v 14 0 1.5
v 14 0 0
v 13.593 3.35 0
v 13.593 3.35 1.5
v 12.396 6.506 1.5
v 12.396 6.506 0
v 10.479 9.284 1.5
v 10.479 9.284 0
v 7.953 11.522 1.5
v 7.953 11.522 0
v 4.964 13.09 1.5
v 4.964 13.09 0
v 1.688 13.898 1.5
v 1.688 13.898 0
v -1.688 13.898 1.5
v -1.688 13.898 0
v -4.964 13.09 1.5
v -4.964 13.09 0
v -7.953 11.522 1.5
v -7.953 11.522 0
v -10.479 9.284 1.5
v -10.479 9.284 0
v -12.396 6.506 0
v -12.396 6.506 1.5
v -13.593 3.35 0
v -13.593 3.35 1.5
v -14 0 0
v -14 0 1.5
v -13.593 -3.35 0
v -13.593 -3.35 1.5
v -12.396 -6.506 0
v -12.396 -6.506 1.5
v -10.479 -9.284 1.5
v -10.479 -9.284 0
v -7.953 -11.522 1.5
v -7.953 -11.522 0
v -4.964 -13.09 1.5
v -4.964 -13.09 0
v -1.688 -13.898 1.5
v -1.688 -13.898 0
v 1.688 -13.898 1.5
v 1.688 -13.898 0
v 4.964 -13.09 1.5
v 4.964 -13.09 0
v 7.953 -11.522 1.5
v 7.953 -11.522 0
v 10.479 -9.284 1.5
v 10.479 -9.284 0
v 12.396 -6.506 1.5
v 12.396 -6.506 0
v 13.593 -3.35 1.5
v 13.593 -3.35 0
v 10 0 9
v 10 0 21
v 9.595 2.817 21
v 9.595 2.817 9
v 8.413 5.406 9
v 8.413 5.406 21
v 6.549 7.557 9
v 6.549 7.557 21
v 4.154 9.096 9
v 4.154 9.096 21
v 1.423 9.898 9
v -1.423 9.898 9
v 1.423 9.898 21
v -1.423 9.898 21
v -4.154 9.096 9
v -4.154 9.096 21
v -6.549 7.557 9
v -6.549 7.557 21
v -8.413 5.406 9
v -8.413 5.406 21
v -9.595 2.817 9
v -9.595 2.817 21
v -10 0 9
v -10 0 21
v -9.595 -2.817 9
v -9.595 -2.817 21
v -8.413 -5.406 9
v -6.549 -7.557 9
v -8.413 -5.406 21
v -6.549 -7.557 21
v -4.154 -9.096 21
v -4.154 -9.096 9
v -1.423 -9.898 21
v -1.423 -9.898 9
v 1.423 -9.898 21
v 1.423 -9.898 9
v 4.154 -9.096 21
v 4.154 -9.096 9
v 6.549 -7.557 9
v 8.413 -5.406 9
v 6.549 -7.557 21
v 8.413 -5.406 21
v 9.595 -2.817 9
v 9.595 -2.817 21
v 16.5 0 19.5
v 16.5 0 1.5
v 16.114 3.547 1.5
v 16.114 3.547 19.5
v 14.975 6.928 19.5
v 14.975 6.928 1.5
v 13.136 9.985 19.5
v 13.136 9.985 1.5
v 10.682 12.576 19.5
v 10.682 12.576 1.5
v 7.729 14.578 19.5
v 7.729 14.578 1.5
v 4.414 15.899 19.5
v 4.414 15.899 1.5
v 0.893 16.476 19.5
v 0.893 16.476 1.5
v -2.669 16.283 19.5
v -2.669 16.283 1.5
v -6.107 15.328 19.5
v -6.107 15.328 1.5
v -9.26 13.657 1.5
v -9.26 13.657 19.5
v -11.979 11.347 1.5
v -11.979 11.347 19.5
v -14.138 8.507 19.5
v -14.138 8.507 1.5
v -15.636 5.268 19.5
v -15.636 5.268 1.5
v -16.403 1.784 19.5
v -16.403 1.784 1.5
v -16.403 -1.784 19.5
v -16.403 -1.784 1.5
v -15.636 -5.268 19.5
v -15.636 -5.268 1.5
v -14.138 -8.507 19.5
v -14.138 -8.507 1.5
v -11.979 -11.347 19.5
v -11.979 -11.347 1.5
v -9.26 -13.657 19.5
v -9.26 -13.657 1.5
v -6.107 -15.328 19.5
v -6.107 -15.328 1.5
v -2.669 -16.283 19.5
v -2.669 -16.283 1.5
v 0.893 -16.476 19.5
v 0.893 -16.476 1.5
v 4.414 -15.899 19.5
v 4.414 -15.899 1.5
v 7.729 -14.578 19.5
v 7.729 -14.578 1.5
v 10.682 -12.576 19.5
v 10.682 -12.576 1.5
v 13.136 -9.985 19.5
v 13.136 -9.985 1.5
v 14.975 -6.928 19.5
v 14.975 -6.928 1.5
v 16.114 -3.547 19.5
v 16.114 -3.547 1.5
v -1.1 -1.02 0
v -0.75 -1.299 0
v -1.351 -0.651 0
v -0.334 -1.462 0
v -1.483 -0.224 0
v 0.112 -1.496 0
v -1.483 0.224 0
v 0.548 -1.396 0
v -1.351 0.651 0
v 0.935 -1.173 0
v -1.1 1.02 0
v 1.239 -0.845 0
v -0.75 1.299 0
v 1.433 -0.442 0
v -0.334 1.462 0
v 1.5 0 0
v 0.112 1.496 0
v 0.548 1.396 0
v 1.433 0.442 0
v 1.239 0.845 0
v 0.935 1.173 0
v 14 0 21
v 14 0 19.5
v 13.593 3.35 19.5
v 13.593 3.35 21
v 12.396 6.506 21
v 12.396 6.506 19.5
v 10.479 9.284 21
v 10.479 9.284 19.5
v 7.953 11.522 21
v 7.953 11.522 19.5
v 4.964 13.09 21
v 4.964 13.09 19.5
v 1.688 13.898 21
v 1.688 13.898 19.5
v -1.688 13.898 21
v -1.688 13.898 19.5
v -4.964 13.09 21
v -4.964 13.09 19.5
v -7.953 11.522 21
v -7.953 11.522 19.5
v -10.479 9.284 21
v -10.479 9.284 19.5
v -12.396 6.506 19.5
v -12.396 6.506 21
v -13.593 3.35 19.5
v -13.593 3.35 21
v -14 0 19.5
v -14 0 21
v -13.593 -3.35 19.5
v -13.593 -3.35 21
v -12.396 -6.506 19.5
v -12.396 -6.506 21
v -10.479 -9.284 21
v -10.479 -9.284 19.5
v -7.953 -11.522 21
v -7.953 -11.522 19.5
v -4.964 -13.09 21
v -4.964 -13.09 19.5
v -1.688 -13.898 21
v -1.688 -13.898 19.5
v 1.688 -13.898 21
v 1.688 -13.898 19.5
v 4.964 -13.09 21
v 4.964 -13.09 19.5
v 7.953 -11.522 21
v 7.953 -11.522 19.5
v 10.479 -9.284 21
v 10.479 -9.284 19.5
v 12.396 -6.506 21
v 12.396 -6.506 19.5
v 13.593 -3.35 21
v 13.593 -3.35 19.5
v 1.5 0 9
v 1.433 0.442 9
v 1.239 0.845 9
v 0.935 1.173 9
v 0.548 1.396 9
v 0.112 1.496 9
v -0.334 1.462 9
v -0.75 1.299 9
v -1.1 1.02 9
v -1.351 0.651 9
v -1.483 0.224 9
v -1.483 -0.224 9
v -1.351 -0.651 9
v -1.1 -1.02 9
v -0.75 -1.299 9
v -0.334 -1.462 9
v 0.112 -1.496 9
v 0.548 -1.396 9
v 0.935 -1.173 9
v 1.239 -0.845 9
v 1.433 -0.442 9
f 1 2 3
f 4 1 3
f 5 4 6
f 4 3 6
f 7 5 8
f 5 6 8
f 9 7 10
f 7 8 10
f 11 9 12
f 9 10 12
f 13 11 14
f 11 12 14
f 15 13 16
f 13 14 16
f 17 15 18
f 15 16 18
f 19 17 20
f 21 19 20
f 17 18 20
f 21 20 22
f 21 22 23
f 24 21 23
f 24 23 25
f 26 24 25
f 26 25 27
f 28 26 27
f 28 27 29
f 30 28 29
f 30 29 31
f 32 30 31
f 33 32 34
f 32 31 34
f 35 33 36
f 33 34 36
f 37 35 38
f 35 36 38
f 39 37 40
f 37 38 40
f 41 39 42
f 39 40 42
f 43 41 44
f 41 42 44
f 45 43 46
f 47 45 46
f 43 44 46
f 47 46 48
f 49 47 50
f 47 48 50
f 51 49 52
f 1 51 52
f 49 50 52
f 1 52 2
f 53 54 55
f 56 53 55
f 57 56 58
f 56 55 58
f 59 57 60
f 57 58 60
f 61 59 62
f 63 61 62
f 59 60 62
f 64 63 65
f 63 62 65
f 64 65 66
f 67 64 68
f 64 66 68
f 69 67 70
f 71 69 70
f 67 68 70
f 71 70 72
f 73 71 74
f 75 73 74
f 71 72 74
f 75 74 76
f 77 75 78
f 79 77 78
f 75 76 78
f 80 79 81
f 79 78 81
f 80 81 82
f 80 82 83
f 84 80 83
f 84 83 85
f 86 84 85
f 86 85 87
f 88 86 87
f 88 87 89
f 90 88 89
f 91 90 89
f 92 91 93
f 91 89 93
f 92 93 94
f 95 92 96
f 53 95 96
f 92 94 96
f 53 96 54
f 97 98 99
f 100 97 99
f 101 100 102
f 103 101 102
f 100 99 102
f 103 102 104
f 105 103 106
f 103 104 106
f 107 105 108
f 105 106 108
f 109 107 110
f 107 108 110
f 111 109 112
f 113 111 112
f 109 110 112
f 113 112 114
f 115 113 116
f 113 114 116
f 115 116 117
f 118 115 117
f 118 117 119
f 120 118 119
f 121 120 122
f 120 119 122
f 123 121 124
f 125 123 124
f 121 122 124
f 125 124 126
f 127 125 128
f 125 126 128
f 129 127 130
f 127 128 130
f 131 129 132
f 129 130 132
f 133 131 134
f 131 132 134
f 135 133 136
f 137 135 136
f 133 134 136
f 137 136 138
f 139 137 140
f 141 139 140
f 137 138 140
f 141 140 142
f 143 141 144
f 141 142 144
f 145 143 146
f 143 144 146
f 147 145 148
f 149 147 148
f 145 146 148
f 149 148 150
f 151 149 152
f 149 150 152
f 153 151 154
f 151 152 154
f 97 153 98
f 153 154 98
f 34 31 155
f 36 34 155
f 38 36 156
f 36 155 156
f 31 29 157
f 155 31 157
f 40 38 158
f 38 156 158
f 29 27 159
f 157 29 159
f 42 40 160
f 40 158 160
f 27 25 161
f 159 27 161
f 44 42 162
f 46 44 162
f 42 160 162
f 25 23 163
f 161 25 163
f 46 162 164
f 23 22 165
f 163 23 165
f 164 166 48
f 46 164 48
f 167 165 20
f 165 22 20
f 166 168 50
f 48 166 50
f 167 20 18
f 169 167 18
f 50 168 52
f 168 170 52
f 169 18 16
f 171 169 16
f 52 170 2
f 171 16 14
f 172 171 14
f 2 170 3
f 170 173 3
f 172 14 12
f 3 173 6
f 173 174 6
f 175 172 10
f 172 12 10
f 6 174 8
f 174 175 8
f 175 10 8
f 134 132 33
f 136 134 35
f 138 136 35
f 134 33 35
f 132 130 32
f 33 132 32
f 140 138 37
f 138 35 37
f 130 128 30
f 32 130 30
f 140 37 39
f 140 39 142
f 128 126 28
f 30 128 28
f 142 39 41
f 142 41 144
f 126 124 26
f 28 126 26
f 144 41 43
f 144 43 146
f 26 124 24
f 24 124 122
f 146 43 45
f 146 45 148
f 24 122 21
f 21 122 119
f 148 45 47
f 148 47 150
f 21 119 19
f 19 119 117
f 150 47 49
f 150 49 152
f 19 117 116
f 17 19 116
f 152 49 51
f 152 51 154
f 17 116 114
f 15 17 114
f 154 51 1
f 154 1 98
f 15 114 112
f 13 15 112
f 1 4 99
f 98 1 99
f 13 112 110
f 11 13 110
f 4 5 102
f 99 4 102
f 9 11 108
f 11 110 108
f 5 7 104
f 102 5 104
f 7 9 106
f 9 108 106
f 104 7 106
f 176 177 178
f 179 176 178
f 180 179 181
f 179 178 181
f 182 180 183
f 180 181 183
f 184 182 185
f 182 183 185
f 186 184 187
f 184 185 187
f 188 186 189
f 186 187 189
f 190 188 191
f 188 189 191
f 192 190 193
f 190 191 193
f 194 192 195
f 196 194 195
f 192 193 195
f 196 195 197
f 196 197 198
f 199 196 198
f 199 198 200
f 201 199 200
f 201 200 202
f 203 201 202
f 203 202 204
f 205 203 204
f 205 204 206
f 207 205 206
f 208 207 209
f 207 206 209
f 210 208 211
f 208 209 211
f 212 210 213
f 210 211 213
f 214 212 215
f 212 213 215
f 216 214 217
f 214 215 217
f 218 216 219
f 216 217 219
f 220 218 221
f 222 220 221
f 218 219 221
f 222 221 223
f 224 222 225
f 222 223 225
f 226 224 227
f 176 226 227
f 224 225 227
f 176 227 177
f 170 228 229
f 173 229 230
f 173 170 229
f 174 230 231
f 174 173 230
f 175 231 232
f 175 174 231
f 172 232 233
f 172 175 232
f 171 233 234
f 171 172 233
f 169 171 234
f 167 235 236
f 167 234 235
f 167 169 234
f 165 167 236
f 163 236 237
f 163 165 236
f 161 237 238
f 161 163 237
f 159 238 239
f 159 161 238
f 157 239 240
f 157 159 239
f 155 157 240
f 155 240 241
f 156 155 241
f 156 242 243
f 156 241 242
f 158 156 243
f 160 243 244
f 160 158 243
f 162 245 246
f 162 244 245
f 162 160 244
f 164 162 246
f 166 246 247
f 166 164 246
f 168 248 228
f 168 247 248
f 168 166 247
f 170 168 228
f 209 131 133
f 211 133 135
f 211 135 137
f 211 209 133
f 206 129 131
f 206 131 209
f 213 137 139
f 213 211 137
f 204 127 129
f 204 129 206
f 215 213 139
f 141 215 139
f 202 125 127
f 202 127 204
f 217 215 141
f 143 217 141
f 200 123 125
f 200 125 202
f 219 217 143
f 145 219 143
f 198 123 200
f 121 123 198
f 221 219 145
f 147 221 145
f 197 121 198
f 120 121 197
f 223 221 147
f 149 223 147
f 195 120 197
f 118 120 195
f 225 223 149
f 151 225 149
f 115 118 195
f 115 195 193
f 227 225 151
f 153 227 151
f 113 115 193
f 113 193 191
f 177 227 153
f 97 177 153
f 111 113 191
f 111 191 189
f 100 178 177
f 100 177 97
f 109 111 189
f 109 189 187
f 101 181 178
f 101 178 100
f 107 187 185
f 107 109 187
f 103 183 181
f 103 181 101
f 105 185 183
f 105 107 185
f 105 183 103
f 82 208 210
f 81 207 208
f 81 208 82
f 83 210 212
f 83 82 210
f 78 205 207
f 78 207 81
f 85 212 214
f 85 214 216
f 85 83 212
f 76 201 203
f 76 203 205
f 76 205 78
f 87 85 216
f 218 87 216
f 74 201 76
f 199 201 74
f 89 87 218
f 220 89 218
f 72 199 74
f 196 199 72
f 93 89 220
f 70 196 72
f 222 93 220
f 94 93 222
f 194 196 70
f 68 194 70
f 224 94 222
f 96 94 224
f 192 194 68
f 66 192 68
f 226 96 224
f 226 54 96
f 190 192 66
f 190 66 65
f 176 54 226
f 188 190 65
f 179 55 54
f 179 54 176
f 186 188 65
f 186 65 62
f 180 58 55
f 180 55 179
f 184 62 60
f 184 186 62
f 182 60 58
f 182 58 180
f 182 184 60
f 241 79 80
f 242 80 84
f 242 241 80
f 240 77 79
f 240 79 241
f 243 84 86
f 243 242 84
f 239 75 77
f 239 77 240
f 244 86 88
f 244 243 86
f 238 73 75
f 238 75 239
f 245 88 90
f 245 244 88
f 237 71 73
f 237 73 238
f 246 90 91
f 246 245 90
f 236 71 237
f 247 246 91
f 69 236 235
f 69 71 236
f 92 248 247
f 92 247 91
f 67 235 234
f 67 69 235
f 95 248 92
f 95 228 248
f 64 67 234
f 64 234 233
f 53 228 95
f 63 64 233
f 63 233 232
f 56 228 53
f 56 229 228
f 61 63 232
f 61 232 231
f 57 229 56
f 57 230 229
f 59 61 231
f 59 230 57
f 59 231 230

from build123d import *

# Parameters (mm, degrees)
SKETCH1_R           = 14
SKETCH1_R_2         = 1.5
BOSS_EXTRUDE1_DEPTH = 1.5
SKETCH2_R           = 10.5
SKETCH2_R_2         = 1.5
BOSS_EXTRUDE2_DEPTH = 18
SKETCH3_R           = 14
SKETCH3_R_2         = 1.5
BOSS_EXTRUDE3_DEPTH = 1.5
SKETCH4_R           = 10
CUT_EXTRUDE1_DEPTH  = 12
SKETCH5_R           = 16.5
SKETCH5_R_2         = 10.5
BOSS_EXTRUDE4_DEPTH = 18


with BuildPart() as part:
    # Sketch1 → Boss-Extrude1 (new body)
    with BuildSketch(Plane.XY):
        Circle(SKETCH1_R)
        Circle(SKETCH1_R_2, mode=Mode.SUBTRACT)
    extrude(amount=BOSS_EXTRUDE1_DEPTH)

    # Sketch2 → Boss-Extrude2 (add)
    with BuildSketch(Plane.XY.offset(1.5)):
        Circle(SKETCH2_R)
        Circle(SKETCH2_R_2, mode=Mode.SUBTRACT)
    extrude(amount=BOSS_EXTRUDE2_DEPTH)

    # Sketch3 → Boss-Extrude3 (add)
    with BuildSketch(Plane.XY.offset(19.5)):
        Circle(SKETCH3_R)
        Circle(SKETCH3_R_2, mode=Mode.SUBTRACT)
    extrude(amount=BOSS_EXTRUDE3_DEPTH)

    # Sketch4 → Cut-Extrude1 (cut)
    with BuildSketch(Plane.XY.offset(21)):
        Circle(SKETCH4_R)
    extrude(amount=-CUT_EXTRUDE1_DEPTH, mode=Mode.SUBTRACT)

    # Sketch5 → Boss-Extrude4 (add)
    with BuildSketch(Plane.XY.offset(1.5)):
        Circle(SKETCH5_R)
        Circle(SKETCH5_R_2, mode=Mode.SUBTRACT)
    extrude(amount=BOSS_EXTRUDE4_DEPTH)


solid = part.part
